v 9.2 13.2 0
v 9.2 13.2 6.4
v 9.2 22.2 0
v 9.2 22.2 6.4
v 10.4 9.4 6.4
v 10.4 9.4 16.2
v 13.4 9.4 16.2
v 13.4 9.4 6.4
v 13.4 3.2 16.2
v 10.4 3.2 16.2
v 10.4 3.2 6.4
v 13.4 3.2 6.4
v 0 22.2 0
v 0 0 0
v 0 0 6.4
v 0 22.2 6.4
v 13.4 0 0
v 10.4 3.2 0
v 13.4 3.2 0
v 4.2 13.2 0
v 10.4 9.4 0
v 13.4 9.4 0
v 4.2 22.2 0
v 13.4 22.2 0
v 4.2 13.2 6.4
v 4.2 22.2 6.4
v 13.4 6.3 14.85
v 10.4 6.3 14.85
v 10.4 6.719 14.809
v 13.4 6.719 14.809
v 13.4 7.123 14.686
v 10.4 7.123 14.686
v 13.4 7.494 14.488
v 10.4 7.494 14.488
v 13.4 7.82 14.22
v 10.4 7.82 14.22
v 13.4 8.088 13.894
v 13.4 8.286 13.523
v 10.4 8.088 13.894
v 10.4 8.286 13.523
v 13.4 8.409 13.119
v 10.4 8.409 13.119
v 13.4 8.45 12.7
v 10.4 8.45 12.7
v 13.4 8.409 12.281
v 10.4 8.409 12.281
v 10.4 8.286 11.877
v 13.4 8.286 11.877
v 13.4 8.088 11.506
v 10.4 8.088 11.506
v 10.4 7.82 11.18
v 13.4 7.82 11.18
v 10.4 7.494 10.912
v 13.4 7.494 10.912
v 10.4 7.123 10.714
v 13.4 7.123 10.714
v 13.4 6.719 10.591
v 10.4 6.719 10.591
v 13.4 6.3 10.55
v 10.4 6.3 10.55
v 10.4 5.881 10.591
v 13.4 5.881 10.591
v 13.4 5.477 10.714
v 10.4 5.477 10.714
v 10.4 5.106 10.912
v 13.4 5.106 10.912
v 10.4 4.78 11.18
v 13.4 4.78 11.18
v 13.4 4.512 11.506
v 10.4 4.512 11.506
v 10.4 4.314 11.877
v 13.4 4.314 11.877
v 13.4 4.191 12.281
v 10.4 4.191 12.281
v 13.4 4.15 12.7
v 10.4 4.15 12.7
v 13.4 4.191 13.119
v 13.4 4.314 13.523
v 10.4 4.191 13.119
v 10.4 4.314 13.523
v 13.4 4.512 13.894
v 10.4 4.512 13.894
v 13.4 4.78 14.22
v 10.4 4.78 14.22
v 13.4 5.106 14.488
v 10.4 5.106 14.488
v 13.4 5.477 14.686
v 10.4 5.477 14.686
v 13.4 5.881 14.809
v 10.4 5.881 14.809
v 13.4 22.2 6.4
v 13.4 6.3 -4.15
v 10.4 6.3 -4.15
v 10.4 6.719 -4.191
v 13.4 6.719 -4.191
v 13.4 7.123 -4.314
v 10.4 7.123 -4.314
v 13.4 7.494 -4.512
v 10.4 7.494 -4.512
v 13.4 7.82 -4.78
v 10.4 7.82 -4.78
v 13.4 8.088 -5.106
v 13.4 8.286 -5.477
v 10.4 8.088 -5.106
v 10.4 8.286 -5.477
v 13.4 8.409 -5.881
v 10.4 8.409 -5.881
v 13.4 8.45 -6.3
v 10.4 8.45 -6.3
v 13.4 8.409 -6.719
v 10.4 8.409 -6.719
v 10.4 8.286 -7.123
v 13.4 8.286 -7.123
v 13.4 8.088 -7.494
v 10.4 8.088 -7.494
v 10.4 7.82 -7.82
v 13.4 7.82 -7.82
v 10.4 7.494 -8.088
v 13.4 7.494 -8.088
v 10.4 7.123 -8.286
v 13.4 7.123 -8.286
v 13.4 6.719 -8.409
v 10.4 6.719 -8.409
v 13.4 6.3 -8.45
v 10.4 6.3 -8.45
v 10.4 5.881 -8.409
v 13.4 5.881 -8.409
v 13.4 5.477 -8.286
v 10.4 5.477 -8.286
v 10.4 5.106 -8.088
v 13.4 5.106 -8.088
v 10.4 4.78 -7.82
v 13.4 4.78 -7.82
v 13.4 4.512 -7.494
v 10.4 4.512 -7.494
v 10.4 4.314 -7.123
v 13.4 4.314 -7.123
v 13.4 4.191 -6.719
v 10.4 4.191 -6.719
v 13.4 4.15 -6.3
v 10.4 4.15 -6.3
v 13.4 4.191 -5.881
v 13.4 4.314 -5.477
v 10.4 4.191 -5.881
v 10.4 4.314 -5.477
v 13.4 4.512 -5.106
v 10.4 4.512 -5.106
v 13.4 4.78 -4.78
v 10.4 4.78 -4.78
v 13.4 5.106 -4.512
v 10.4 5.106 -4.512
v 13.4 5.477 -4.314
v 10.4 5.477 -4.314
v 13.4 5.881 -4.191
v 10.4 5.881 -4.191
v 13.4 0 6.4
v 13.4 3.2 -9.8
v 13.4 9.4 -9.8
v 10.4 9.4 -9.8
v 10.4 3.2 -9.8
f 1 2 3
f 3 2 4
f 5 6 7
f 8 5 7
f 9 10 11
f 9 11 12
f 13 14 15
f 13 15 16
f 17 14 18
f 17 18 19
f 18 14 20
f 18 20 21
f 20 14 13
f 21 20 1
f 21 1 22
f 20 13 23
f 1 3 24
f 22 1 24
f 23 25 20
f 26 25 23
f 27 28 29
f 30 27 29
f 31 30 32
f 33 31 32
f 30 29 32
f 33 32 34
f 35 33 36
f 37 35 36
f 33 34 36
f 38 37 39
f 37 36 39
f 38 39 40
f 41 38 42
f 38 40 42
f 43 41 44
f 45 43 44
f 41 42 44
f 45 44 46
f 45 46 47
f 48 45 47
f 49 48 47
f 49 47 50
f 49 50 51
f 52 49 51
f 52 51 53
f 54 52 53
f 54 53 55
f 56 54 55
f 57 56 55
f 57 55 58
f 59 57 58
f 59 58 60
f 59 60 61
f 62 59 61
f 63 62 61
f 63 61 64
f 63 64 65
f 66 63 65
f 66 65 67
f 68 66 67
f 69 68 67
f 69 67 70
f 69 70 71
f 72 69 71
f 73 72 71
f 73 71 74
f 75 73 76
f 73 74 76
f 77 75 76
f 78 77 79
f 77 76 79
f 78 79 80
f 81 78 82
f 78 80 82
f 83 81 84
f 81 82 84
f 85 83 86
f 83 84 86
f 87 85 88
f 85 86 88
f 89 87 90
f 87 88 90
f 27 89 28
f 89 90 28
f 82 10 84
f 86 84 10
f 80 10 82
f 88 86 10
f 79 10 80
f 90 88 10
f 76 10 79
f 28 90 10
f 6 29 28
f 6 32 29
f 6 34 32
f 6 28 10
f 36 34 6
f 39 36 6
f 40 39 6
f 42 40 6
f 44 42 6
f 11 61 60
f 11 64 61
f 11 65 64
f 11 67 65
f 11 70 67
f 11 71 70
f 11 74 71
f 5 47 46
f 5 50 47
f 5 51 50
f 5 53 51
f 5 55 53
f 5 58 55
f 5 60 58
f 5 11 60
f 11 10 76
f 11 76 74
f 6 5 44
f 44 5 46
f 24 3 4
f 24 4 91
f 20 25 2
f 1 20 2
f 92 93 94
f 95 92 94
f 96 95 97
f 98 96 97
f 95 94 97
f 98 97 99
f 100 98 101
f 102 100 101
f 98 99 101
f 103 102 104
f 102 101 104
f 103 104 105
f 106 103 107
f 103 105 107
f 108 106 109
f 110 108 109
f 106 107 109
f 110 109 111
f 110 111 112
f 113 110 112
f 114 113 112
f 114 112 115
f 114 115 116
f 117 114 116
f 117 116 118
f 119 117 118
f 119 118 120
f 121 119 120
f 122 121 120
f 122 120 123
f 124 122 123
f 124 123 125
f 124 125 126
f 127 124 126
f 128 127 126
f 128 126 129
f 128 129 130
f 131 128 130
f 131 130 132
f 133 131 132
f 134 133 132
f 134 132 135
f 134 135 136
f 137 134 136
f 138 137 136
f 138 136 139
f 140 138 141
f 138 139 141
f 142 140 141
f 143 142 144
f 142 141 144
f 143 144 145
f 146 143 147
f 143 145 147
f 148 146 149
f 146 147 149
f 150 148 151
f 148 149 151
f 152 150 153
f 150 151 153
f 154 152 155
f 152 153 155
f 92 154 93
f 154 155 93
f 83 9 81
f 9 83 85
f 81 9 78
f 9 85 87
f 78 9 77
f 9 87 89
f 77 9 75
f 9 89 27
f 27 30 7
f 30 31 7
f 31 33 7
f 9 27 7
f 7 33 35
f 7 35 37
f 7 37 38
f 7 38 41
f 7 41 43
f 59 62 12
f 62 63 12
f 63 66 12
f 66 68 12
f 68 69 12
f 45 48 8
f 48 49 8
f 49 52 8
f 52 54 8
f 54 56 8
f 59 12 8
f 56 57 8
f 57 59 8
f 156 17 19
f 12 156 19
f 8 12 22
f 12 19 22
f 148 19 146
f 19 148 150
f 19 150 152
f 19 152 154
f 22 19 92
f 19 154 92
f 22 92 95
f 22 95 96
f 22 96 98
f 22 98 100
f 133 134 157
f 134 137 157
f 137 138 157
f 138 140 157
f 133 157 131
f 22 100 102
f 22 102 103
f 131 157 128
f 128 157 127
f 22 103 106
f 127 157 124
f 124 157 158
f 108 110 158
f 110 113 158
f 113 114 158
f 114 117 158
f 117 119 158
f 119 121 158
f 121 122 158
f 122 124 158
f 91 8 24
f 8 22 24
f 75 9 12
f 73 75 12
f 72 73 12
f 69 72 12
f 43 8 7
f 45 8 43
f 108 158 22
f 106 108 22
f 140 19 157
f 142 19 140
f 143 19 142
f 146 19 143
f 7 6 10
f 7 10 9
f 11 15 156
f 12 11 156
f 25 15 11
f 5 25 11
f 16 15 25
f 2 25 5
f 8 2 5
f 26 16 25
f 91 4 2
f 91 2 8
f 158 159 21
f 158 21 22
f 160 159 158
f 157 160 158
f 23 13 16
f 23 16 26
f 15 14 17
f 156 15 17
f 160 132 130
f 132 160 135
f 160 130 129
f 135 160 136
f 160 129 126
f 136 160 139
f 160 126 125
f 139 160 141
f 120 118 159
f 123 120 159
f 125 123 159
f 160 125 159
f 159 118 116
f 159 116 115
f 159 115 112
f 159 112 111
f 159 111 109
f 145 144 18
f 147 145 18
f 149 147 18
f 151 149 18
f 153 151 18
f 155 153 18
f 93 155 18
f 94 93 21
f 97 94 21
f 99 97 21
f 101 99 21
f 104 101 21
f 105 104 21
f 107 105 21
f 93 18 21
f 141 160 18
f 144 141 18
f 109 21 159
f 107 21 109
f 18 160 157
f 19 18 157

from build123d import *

# Parameters (mm, degrees)
SKETCH_1_W          = 13.4
SKETCH_1_H          = 22.2
EXTRUDE_1_DEPTH     = 6.4
SKETCH_2_W          = 5
SKETCH_2_H          = 9
CUT_EXTRUDE_1_DEPTH = 6.4
SKETCH_3_W          = 3
SKETCH_3_H          = 6.2
EXTRUDE_2_DEPTH     = 9.8
SKETCH_4_R          = 2.15
CUT_EXTRUDE_2_DEPTH = 9.8


with BuildPart() as part:
    # 草图1 → 凸台-拉伸1 (new body)
    with BuildSketch(Plane.XY):
        with Locations((6.7, 11.1)):
            Rectangle(SKETCH_1_W, SKETCH_1_H)
    extrude(amount=EXTRUDE_1_DEPTH)

    # 草图2 → 切除-拉伸1 (cut)
    with BuildSketch(Plane.XY.offset(6.4)):
        with Locations((6.7, 17.7)):
            Rectangle(SKETCH_2_W, SKETCH_2_H)
    extrude(amount=-CUT_EXTRUDE_1_DEPTH, mode=Mode.SUBTRACT)

    # 草图3 → 凸台-拉伸2 (add)
    with BuildSketch(Plane.XY.offset(6.4)):
        with Locations((11.9, 6.3)):
            Rectangle(SKETCH_3_W, SKETCH_3_H)
    extrude_2 = extrude(amount=EXTRUDE_2_DEPTH)

    # 镜向1: 凸台-拉伸2 across plane
    add(extrude_2.mirror(Plane(origin=(0, 0, 3.2), x_dir=(1, 0, 0), z_dir=(0, 0, -1))))

    # 草图4 → 切除-拉伸2 (cut)
    with BuildSketch(Plane.ZY.offset(-10.4)):
        with Locations((-6.3, 6.3)):
            Circle(SKETCH_4_R)
        with Locations((12.7, 6.3)):
            Circle(SKETCH_4_R)
    extrude(amount=-CUT_EXTRUDE_2_DEPTH, mode=Mode.SUBTRACT)


solid = part.part
